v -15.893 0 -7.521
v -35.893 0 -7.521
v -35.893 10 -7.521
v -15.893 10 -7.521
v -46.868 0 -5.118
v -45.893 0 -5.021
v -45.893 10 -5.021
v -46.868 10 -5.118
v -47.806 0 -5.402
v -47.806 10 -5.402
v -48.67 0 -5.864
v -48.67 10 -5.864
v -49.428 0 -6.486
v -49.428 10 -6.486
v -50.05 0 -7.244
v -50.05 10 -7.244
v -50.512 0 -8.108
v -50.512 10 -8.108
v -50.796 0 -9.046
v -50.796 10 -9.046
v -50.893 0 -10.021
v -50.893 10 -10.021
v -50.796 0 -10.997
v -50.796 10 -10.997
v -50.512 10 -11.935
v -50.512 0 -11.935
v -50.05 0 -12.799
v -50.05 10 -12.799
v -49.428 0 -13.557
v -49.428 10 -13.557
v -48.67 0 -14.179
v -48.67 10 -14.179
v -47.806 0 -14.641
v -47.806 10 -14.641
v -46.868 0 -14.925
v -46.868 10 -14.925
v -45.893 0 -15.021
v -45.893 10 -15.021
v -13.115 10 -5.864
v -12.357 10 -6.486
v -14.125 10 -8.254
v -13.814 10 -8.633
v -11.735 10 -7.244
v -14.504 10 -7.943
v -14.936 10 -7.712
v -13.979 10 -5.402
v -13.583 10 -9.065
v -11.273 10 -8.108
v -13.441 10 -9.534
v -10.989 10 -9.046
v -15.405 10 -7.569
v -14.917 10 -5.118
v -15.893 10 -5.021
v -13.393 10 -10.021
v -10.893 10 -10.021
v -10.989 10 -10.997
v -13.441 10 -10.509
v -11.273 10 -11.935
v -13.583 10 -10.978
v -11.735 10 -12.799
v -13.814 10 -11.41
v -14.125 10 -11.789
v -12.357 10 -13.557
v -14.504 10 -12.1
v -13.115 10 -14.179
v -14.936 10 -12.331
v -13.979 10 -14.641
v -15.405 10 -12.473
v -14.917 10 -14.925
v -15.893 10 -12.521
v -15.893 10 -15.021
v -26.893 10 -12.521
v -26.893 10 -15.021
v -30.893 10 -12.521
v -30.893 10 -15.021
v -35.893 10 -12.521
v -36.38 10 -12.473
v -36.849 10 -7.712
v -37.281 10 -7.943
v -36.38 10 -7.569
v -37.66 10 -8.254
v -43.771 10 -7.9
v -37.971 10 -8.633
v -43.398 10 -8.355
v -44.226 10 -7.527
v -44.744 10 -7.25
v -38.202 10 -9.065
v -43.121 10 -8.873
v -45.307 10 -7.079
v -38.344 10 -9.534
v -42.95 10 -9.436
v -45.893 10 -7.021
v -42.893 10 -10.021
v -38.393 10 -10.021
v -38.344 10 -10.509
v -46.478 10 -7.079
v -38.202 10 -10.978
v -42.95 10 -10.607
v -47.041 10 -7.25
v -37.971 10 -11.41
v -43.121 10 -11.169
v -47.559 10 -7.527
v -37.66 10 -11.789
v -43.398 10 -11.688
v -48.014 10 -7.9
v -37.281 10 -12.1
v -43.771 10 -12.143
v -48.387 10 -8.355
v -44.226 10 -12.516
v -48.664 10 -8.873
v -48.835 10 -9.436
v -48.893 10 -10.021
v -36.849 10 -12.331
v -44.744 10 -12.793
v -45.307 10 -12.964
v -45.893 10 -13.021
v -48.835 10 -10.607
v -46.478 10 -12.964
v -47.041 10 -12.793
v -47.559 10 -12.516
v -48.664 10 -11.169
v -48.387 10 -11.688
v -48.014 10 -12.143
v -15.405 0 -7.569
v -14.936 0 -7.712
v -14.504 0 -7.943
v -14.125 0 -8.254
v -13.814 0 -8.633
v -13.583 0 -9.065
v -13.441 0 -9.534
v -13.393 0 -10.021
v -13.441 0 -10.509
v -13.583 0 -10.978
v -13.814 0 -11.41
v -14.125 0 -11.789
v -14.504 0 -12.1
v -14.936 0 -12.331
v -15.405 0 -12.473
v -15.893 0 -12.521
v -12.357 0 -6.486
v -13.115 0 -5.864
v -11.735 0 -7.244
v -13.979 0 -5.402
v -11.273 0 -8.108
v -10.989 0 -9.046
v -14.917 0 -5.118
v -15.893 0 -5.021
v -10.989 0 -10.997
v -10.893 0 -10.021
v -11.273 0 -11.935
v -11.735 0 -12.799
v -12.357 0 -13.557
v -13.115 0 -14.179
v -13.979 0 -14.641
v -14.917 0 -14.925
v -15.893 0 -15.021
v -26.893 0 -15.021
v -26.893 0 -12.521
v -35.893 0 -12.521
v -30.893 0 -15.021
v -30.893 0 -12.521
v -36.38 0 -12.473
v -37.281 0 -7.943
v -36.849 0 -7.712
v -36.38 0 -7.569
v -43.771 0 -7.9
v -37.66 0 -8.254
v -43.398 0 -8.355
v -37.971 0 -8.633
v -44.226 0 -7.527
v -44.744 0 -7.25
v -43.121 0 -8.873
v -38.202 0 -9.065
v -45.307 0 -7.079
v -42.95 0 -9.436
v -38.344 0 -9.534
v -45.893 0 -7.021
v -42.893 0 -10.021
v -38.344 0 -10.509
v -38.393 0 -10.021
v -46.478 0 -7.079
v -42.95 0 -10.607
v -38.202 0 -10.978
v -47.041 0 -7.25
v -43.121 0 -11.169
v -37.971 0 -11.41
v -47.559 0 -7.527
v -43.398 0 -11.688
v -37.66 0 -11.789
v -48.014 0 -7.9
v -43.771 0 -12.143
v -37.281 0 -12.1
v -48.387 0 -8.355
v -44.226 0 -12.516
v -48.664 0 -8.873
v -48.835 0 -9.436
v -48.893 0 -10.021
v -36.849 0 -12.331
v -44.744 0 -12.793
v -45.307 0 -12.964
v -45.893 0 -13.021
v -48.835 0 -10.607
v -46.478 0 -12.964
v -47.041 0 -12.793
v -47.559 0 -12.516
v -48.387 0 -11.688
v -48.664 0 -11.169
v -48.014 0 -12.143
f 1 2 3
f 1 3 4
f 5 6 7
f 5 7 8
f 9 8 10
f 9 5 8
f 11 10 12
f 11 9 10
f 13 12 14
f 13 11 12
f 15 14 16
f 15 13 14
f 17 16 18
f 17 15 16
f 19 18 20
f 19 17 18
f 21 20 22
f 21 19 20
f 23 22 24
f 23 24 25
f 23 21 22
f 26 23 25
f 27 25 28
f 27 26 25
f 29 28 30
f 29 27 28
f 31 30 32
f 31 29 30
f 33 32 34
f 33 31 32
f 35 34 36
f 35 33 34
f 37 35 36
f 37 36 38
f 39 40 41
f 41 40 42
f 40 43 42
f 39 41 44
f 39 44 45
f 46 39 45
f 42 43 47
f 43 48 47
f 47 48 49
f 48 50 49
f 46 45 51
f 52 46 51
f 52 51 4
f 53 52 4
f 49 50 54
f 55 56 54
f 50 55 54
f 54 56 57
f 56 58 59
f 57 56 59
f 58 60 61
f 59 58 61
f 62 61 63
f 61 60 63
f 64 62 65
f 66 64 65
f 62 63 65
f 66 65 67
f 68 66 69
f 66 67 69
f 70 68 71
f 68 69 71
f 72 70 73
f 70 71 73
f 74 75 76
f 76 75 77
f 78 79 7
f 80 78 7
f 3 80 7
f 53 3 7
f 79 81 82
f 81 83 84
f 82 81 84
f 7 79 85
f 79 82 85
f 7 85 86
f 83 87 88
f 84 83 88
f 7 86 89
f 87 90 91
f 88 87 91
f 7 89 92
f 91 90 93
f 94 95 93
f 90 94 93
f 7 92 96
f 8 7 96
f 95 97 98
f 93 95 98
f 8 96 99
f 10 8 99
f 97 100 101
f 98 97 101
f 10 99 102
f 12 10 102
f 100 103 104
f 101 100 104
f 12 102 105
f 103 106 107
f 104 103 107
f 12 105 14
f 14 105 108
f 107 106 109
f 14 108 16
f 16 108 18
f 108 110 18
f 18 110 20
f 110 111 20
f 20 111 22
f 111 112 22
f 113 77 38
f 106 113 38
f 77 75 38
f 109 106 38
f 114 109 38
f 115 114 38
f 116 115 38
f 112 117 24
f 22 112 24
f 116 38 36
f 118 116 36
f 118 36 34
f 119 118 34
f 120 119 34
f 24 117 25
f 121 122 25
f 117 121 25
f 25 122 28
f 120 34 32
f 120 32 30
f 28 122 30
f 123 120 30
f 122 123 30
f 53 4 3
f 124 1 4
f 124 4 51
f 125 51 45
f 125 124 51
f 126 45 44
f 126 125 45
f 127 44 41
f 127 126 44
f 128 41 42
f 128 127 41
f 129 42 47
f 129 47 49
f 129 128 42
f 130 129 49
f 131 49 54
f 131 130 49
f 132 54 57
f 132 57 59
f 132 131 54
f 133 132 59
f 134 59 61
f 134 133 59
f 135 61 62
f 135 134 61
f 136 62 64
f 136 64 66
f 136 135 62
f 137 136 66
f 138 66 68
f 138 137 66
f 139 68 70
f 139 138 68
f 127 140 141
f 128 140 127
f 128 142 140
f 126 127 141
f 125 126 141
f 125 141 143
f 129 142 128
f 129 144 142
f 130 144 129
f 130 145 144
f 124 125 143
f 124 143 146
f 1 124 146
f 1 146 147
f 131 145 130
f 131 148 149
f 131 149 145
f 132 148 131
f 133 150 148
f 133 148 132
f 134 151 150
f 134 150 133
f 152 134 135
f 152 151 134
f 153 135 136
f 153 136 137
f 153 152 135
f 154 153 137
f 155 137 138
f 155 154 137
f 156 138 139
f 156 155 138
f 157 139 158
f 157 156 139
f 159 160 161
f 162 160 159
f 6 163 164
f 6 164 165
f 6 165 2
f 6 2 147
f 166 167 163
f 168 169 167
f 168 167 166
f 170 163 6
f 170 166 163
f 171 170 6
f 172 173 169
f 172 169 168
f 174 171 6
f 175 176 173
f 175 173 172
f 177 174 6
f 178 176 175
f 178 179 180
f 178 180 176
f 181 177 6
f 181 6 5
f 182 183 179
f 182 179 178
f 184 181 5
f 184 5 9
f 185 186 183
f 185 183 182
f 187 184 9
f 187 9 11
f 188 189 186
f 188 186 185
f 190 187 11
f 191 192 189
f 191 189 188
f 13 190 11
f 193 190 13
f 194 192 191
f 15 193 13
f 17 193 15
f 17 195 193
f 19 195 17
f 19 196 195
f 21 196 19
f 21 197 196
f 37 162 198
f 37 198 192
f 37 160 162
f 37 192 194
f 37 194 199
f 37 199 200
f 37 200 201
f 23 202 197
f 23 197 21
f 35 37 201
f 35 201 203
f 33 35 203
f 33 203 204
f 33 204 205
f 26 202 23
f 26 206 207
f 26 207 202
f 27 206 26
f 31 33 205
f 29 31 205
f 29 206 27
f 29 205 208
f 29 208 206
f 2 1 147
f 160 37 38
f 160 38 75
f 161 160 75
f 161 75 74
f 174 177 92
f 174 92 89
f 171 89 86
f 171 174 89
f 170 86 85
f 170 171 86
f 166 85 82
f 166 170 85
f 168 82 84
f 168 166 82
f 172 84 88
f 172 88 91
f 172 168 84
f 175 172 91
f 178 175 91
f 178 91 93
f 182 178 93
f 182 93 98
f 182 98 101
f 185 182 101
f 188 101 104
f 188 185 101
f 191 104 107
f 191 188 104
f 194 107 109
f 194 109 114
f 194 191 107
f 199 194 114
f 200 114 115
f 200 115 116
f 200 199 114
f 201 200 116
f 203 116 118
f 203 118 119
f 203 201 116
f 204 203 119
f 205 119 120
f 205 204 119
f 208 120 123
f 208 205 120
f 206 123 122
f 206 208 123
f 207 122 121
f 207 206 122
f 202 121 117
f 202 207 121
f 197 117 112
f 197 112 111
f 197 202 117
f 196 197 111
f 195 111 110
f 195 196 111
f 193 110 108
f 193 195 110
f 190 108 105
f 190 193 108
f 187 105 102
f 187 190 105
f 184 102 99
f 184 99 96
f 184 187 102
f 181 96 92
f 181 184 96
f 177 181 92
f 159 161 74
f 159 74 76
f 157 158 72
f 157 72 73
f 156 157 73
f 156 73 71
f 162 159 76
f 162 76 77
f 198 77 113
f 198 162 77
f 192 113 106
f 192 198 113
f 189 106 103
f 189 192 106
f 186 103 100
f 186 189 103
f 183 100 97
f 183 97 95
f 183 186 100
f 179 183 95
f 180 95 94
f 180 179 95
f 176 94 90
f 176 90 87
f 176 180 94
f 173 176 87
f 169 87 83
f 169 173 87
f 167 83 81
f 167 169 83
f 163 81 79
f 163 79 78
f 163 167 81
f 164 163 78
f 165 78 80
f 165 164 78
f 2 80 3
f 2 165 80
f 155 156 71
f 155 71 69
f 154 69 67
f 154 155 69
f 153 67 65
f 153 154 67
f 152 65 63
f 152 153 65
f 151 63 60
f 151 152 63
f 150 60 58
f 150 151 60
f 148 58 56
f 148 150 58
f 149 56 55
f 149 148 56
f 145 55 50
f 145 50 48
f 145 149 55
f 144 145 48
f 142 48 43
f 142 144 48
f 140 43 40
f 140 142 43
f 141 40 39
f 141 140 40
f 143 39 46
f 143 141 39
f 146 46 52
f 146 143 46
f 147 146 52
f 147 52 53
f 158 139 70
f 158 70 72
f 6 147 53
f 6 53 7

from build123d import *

# Parameters (mm, degrees)
SKETCH1_R           = 3
BOSS_EXTRUDE1_DEPTH = 10


with BuildPart() as part:
    # Sketch1 → Boss-Extrude1 (new body)
    with BuildSketch(Plane(origin=(0, 0, 0), x_dir=(1, 0, 0), z_dir=(0, 1, 0))):
        with BuildLine():
            Line((-45.892533193, 15.021428325), (-30.892533193, 15.021428325))
            Line((-30.892533193, 15.021428325), (-30.892533193, 12.521428325))
            Line((-30.892533193, 12.521428325), (-35.892533193, 12.521428325))
            ThreePointArc((-35.892533193, 12.521428325), (-38.392533193, 10.021428325), (-35.892533193, 7.521428325))
            Line((-35.892533193, 7.521428325), (-15.892533193, 7.521428325))
            ThreePointArc((-15.892533193, 7.521428325), (-13.392533193, 10.021428325), (-15.892533193, 12.521428325))
            Line((-15.892533193, 12.521428325), (-26.892533193, 12.521428325))
            Line((-26.892533193, 12.521428325), (-26.892533193, 15.021428325))
            Line((-26.892533193, 15.021428325), (-15.892533193, 15.021428325))
            ThreePointArc((-15.892533193, 15.021428325), (-10.892533193, 10.021428325), (-15.892533193, 5.021428325))
            Line((-15.892533193, 5.021428325), (-45.892533193, 5.021428325))
            ThreePointArc((-45.892533193, 5.021428325), (-50.892533193, 10.021428325), (-45.892533193, 15.021428325))
        make_face()
        with Locations(Location((-45.892533193, 10.021428325, 0), (0, 0, 270))):
            Circle(SKETCH1_R, mode=Mode.SUBTRACT)
    extrude(amount=BOSS_EXTRUDE1_DEPTH)


solid = part.part
